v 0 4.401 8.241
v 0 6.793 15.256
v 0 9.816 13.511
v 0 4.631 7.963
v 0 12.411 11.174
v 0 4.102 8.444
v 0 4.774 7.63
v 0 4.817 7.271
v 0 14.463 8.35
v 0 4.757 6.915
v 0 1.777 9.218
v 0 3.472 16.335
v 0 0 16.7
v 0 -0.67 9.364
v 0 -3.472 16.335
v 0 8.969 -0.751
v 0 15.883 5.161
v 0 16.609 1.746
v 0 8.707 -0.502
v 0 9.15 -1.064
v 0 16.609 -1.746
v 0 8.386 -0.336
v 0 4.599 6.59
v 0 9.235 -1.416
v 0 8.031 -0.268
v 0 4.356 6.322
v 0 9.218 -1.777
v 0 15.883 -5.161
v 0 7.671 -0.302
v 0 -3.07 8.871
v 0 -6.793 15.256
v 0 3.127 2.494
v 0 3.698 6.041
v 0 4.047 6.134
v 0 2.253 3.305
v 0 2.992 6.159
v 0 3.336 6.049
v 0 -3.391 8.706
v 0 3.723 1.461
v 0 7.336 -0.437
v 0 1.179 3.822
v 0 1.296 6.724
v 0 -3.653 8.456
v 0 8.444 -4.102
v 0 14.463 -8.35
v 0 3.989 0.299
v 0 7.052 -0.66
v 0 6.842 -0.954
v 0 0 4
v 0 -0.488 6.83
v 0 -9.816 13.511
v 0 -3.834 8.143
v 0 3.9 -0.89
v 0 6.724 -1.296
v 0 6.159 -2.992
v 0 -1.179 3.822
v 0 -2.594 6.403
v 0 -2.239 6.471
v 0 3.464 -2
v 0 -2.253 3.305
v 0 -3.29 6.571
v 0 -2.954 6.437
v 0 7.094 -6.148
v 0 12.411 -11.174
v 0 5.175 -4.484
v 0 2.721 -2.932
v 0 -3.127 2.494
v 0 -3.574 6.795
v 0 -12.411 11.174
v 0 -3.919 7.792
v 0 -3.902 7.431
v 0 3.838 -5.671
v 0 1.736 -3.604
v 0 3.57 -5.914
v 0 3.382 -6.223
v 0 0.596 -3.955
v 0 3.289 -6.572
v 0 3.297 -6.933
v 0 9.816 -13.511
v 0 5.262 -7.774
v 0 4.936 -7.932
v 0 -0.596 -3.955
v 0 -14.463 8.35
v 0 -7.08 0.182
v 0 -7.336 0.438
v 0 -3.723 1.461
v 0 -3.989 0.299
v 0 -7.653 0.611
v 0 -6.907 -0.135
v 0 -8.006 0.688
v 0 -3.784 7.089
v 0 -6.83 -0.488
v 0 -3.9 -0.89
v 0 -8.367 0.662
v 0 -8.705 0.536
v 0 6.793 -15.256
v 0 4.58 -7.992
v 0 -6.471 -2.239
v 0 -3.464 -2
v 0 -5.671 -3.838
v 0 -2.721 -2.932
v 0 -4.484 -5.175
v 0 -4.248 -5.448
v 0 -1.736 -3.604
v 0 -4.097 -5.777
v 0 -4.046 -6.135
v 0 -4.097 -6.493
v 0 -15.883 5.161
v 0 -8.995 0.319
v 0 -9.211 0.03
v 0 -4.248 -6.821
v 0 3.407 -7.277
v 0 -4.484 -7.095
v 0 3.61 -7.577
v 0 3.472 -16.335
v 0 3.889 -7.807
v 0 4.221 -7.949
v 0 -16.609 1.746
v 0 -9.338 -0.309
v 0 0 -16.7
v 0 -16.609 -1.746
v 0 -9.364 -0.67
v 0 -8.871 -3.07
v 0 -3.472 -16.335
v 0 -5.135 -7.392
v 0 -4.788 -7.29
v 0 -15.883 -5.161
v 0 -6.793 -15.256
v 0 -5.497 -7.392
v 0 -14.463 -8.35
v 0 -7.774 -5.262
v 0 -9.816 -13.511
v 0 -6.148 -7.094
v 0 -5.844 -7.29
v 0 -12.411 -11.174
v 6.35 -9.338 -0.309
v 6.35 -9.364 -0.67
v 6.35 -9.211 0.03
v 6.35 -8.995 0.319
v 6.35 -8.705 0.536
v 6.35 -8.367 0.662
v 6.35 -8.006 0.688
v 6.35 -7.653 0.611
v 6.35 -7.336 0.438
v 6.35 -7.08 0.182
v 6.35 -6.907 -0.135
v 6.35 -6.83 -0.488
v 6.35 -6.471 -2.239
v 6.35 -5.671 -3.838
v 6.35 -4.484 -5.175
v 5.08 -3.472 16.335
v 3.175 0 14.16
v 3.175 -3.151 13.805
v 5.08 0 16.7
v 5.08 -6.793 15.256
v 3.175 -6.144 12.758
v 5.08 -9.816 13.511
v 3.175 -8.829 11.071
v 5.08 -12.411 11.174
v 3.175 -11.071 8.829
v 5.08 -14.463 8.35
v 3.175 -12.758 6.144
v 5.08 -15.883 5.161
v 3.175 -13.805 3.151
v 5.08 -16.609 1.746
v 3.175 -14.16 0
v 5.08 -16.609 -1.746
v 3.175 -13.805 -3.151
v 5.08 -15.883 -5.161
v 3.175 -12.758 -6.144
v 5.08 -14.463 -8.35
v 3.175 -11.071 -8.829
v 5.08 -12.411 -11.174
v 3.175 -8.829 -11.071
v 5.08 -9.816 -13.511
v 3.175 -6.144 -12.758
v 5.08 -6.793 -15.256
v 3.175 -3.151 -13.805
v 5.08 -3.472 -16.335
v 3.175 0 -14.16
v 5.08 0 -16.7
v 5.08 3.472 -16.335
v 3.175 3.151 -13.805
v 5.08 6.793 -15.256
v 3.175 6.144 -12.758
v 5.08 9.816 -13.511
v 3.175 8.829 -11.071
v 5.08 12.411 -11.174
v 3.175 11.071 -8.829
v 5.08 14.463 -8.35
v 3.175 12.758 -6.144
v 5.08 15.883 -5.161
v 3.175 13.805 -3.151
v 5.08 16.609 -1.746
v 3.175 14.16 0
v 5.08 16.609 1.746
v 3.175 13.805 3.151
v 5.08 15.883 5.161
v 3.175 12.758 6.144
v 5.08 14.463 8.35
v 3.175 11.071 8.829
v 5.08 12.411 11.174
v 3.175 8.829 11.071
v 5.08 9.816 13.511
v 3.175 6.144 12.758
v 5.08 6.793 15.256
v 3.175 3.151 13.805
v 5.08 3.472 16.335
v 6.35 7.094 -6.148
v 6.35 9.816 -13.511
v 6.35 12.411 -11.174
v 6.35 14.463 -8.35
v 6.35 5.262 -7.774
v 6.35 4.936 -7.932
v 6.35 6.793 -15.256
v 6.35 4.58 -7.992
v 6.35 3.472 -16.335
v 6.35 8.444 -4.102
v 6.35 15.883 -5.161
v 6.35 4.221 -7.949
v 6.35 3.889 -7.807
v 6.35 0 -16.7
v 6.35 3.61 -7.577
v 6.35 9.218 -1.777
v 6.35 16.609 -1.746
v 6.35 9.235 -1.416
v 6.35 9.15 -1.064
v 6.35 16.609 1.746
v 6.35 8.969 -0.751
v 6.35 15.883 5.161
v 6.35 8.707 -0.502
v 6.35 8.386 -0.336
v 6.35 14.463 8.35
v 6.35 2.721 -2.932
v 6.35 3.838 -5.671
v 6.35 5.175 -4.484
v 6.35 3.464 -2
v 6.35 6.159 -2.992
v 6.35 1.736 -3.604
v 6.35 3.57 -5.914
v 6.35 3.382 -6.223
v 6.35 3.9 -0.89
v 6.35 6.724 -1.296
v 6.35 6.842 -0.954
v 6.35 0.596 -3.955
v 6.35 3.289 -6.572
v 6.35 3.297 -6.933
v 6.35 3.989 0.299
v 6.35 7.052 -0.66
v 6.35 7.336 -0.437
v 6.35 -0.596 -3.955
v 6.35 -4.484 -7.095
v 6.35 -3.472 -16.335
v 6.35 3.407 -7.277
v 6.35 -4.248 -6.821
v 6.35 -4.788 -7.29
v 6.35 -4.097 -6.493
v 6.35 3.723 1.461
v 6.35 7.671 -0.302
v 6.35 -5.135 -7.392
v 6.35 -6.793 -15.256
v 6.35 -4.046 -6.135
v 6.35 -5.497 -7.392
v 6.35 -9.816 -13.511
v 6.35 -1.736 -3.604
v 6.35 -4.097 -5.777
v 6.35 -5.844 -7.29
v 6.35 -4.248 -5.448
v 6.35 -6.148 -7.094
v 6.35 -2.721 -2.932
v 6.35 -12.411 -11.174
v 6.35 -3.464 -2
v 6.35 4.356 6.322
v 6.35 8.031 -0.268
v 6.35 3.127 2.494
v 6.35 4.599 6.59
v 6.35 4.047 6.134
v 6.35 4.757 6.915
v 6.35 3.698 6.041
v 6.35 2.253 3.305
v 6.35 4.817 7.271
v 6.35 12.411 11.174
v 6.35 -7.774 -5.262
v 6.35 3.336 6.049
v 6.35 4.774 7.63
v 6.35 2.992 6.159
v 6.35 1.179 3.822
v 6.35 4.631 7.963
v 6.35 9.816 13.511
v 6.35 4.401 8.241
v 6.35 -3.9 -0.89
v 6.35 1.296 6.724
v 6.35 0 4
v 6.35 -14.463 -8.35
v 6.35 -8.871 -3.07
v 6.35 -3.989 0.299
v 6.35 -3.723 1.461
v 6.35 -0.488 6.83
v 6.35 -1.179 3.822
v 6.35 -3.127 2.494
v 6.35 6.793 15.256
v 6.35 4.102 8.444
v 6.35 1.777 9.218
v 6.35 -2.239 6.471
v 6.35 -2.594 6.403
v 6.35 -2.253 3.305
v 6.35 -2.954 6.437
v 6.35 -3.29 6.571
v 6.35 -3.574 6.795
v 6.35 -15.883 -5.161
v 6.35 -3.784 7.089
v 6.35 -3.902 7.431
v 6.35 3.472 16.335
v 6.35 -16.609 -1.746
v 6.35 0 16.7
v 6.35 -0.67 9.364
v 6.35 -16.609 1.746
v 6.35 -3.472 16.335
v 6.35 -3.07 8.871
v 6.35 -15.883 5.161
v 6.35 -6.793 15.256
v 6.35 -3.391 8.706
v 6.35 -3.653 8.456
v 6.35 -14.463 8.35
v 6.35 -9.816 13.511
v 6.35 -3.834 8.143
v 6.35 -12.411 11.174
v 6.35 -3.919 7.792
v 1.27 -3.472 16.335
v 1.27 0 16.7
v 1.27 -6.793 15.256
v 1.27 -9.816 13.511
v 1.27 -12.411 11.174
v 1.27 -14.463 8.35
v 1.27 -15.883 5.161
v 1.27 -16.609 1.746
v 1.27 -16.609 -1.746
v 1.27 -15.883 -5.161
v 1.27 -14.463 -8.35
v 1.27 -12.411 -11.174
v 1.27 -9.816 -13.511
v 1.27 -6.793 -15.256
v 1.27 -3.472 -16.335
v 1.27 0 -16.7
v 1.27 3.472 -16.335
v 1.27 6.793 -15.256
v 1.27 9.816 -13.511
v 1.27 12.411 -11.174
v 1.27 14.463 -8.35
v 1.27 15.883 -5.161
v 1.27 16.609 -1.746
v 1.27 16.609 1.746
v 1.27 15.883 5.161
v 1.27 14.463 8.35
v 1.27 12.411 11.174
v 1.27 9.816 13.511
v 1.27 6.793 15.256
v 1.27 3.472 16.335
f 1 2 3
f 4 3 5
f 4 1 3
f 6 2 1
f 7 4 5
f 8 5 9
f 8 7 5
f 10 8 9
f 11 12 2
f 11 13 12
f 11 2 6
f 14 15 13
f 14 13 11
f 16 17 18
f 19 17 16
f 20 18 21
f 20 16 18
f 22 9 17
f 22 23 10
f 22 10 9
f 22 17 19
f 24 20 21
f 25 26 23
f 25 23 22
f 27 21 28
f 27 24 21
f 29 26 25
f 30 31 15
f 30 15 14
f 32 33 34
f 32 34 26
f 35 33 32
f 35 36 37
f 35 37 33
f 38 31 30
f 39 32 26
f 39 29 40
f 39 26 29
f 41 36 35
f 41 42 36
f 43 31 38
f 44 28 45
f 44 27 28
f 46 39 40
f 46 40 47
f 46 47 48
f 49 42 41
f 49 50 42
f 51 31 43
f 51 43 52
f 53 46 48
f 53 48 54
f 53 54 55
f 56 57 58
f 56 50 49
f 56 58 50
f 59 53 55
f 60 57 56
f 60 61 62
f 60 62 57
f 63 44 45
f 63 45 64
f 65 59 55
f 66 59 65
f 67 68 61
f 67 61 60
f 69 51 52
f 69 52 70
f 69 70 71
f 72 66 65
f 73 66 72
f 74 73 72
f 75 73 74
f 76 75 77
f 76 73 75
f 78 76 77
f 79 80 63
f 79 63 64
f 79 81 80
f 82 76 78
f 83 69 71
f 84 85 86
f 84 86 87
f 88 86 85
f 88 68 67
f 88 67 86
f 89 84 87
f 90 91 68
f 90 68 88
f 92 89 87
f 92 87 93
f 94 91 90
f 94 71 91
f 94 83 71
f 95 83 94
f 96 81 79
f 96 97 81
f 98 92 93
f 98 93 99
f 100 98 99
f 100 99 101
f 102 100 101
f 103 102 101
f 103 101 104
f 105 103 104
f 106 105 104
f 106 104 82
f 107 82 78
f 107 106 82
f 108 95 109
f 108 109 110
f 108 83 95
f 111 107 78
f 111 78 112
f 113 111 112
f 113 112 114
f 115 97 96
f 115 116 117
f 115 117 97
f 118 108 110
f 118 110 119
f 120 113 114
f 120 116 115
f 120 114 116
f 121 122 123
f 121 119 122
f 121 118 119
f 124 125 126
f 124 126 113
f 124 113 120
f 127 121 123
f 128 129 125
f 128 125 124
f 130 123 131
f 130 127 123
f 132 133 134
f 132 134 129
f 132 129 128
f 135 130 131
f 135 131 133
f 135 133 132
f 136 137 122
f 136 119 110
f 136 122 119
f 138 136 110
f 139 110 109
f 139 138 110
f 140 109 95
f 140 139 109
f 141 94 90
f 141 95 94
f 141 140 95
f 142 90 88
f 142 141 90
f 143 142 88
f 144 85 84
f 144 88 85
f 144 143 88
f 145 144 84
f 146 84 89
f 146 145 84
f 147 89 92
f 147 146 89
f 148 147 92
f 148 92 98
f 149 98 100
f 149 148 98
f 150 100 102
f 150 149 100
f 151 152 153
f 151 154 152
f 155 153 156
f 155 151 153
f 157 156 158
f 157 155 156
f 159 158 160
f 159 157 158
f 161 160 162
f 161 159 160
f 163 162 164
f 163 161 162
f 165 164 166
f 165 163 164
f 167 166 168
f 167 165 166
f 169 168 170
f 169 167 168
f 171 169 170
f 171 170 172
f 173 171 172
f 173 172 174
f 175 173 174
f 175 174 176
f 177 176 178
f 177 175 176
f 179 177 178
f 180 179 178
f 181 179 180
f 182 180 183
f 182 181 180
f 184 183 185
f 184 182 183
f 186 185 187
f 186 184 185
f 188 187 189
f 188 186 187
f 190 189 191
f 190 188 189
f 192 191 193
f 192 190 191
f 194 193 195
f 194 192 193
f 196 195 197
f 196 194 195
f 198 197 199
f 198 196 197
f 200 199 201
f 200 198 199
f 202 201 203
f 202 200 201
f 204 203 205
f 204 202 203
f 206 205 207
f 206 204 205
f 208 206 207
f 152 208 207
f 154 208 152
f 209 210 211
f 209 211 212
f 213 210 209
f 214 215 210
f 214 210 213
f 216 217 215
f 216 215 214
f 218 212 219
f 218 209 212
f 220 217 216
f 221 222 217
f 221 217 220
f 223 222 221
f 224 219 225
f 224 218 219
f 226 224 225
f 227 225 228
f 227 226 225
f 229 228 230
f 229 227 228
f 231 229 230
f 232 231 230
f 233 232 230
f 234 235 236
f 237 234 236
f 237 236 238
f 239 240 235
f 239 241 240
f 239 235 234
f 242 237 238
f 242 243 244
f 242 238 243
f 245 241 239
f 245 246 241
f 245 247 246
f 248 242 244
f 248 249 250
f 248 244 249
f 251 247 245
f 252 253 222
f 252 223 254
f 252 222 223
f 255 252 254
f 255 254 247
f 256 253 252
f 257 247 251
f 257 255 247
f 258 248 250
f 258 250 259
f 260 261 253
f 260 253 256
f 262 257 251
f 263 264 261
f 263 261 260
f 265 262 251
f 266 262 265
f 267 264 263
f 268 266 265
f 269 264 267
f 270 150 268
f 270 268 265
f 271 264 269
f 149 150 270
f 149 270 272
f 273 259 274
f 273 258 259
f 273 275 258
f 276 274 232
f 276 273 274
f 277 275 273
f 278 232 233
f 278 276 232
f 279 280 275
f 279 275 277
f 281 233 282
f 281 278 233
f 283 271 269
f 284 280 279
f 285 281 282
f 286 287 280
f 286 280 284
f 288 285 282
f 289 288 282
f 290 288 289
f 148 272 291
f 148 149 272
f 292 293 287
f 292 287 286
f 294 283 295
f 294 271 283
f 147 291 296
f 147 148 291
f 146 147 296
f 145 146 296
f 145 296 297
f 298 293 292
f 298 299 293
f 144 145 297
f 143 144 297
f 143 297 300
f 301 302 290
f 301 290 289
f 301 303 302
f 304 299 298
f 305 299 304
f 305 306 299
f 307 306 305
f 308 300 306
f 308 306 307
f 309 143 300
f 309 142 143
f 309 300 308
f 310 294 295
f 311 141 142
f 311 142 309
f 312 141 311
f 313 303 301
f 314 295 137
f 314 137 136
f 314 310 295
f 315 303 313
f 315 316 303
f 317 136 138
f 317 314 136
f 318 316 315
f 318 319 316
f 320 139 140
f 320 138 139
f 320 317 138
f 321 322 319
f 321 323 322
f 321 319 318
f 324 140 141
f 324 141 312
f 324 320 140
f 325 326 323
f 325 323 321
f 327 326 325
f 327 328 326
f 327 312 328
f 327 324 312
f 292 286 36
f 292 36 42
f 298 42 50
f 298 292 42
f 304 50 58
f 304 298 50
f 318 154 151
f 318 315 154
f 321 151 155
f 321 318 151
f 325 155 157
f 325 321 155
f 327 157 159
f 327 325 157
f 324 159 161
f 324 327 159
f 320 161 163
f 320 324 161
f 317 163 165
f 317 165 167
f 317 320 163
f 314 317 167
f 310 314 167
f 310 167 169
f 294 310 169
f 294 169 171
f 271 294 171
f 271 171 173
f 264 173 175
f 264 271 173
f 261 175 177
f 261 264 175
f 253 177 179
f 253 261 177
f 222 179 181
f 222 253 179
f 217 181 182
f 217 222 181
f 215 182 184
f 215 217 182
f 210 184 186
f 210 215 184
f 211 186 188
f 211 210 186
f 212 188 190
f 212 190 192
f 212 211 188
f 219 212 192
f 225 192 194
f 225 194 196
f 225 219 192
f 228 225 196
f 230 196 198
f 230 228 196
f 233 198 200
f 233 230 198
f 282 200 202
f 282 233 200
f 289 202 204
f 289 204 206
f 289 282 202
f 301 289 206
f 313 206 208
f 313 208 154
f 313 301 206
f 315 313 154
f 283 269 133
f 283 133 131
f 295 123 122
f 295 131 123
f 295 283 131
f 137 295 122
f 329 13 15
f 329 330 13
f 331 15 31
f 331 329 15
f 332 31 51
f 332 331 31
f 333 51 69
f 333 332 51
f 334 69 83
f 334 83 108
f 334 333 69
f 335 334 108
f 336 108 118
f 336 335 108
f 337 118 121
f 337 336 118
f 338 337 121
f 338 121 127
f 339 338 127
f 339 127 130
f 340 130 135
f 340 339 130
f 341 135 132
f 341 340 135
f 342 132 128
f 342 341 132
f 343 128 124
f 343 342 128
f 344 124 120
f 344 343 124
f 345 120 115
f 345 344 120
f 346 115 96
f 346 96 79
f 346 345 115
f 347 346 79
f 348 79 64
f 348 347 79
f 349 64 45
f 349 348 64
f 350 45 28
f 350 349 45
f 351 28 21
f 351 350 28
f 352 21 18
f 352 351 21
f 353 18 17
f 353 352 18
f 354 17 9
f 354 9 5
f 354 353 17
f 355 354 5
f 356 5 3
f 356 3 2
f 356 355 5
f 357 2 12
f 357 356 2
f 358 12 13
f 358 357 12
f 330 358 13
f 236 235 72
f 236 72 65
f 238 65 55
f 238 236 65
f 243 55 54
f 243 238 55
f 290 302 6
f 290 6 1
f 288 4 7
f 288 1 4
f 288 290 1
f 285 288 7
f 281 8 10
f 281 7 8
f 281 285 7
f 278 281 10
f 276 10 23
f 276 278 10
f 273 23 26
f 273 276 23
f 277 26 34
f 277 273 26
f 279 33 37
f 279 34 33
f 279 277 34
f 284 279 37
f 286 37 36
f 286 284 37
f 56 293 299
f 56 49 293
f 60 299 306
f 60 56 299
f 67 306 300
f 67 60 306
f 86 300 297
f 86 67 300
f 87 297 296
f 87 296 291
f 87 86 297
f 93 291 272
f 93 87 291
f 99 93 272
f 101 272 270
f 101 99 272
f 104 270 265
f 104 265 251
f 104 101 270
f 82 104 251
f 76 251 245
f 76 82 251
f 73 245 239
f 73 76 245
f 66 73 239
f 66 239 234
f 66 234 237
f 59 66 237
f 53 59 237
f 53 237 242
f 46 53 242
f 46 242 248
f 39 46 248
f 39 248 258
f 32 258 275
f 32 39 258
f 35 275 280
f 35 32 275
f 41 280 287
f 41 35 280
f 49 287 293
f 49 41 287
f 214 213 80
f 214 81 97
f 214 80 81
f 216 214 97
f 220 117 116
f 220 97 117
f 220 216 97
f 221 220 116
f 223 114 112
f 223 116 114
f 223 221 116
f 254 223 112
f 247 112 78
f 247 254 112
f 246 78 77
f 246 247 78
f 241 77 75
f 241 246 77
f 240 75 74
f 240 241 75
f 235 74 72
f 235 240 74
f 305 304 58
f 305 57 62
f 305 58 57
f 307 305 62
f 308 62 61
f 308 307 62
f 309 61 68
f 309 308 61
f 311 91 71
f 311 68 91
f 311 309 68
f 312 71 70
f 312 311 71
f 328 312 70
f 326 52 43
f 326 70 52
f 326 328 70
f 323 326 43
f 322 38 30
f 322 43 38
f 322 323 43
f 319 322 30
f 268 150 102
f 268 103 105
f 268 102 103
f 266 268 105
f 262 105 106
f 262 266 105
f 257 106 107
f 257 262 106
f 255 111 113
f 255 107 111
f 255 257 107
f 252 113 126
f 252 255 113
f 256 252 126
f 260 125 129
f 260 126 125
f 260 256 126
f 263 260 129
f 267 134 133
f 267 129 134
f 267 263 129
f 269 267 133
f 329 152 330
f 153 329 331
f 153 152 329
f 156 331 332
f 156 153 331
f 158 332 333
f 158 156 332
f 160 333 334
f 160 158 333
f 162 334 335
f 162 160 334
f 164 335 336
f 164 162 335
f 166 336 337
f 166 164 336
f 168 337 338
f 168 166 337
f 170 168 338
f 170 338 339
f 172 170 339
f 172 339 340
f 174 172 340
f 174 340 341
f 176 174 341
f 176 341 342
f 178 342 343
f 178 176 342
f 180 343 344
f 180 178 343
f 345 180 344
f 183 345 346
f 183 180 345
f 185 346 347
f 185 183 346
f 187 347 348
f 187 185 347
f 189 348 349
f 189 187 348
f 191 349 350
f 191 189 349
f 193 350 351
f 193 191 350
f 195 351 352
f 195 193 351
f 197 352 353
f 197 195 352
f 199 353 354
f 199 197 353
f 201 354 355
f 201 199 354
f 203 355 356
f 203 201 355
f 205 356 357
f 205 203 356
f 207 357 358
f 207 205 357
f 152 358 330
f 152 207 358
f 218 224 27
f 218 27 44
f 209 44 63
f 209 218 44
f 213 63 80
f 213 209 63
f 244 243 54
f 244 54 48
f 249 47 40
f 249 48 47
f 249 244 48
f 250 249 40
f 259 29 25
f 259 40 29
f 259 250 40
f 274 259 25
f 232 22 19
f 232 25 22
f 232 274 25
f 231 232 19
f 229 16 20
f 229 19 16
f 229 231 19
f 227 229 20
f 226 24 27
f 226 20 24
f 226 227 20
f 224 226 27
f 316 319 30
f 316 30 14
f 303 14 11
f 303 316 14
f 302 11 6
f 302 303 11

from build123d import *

# Parameters (mm, degrees)
CUT_EXTRUDE1_DEPTH      = 25.4561342
CUT_EXTRUDE1_DEPTH_BACK = 25.4561342


with BuildPart() as part:
    # Sketch1 → Revolve1 (revolve)
    with BuildSketch(Plane.XY, mode=Mode.PRIVATE) as revolve1_sk:
        Polygon((1.27, 16.7), (3.175, 14.16), (5.08, 16.7), (6.35, 16.7), (6.35, 4), (0, 4), (0, 16.7), align=None)
    revolve(revolve1_sk.sketch.rotate(Axis((0, 0, 0), (1, 0, 0)), 90), axis=Axis((0, 0, 0), (1, 0, 0)))

    # Sketch2 → Cut-Extrude1 (cut, two sides: drawn at the far end of the back side and taken through both)
    with BuildSketch(Plane.ZY.offset(-CUT_EXTRUDE1_DEPTH_BACK)):
        with BuildLine():
            ThreePointArc((-5.174909182, -4.484253782), (-6.96638667, -4.356158459), (-7.094481993, -6.147635947))
            ThreePointArc((-7.094481993, -6.147635947), (-4.201848282, -8.394615744), (-0.66952126, -9.363591392))
            ThreePointArc((-0.66952126, -9.363591392), (0.687821691, -8.187402584), (-0.488367117, -6.830059633))
            ThreePointArc((-0.488367117, -6.830059633), (-3.064943047, -6.123262296), (-5.174909182, -4.484253782))
        make_face()
        with BuildLine():
            ThreePointArc((-1.296023102, 6.723729704), (-0.289350555, 8.211147057), (-1.776767907, 9.217819605))
            ThreePointArc((-1.776767907, 9.217819605), (-5.169026349, 7.836215226), (-7.774347387, 5.261618115))
            ThreePointArc((-7.774347387, 5.261618115), (-7.434409475, 3.498030233), (-5.670821594, 3.837968145))
            ThreePointArc((-5.670821594, 3.837968145), (-3.77042918, 5.715949687), (-1.296023102, 6.723729704))
        make_face()
        with BuildLine():
            ThreePointArc((6.470932282, -2.239475923), (7.255737222, -3.854988599), (8.871249898, -3.070183659))
            ThreePointArc((8.871249898, -3.070183659), (9.370874629, 0.558400517), (8.443868645, 4.101973277))
            ThreePointArc((8.443868645, 4.101973277), (6.746587782, 4.68937235), (6.159188708, 2.992091487))
            ThreePointArc((6.159188708, 2.992091487), (6.835372224, 0.407312608), (6.470932282, -2.239475923))
        make_face()
    extrude(amount=CUT_EXTRUDE1_DEPTH + CUT_EXTRUDE1_DEPTH_BACK, mode=Mode.SUBTRACT)


solid = part.part
